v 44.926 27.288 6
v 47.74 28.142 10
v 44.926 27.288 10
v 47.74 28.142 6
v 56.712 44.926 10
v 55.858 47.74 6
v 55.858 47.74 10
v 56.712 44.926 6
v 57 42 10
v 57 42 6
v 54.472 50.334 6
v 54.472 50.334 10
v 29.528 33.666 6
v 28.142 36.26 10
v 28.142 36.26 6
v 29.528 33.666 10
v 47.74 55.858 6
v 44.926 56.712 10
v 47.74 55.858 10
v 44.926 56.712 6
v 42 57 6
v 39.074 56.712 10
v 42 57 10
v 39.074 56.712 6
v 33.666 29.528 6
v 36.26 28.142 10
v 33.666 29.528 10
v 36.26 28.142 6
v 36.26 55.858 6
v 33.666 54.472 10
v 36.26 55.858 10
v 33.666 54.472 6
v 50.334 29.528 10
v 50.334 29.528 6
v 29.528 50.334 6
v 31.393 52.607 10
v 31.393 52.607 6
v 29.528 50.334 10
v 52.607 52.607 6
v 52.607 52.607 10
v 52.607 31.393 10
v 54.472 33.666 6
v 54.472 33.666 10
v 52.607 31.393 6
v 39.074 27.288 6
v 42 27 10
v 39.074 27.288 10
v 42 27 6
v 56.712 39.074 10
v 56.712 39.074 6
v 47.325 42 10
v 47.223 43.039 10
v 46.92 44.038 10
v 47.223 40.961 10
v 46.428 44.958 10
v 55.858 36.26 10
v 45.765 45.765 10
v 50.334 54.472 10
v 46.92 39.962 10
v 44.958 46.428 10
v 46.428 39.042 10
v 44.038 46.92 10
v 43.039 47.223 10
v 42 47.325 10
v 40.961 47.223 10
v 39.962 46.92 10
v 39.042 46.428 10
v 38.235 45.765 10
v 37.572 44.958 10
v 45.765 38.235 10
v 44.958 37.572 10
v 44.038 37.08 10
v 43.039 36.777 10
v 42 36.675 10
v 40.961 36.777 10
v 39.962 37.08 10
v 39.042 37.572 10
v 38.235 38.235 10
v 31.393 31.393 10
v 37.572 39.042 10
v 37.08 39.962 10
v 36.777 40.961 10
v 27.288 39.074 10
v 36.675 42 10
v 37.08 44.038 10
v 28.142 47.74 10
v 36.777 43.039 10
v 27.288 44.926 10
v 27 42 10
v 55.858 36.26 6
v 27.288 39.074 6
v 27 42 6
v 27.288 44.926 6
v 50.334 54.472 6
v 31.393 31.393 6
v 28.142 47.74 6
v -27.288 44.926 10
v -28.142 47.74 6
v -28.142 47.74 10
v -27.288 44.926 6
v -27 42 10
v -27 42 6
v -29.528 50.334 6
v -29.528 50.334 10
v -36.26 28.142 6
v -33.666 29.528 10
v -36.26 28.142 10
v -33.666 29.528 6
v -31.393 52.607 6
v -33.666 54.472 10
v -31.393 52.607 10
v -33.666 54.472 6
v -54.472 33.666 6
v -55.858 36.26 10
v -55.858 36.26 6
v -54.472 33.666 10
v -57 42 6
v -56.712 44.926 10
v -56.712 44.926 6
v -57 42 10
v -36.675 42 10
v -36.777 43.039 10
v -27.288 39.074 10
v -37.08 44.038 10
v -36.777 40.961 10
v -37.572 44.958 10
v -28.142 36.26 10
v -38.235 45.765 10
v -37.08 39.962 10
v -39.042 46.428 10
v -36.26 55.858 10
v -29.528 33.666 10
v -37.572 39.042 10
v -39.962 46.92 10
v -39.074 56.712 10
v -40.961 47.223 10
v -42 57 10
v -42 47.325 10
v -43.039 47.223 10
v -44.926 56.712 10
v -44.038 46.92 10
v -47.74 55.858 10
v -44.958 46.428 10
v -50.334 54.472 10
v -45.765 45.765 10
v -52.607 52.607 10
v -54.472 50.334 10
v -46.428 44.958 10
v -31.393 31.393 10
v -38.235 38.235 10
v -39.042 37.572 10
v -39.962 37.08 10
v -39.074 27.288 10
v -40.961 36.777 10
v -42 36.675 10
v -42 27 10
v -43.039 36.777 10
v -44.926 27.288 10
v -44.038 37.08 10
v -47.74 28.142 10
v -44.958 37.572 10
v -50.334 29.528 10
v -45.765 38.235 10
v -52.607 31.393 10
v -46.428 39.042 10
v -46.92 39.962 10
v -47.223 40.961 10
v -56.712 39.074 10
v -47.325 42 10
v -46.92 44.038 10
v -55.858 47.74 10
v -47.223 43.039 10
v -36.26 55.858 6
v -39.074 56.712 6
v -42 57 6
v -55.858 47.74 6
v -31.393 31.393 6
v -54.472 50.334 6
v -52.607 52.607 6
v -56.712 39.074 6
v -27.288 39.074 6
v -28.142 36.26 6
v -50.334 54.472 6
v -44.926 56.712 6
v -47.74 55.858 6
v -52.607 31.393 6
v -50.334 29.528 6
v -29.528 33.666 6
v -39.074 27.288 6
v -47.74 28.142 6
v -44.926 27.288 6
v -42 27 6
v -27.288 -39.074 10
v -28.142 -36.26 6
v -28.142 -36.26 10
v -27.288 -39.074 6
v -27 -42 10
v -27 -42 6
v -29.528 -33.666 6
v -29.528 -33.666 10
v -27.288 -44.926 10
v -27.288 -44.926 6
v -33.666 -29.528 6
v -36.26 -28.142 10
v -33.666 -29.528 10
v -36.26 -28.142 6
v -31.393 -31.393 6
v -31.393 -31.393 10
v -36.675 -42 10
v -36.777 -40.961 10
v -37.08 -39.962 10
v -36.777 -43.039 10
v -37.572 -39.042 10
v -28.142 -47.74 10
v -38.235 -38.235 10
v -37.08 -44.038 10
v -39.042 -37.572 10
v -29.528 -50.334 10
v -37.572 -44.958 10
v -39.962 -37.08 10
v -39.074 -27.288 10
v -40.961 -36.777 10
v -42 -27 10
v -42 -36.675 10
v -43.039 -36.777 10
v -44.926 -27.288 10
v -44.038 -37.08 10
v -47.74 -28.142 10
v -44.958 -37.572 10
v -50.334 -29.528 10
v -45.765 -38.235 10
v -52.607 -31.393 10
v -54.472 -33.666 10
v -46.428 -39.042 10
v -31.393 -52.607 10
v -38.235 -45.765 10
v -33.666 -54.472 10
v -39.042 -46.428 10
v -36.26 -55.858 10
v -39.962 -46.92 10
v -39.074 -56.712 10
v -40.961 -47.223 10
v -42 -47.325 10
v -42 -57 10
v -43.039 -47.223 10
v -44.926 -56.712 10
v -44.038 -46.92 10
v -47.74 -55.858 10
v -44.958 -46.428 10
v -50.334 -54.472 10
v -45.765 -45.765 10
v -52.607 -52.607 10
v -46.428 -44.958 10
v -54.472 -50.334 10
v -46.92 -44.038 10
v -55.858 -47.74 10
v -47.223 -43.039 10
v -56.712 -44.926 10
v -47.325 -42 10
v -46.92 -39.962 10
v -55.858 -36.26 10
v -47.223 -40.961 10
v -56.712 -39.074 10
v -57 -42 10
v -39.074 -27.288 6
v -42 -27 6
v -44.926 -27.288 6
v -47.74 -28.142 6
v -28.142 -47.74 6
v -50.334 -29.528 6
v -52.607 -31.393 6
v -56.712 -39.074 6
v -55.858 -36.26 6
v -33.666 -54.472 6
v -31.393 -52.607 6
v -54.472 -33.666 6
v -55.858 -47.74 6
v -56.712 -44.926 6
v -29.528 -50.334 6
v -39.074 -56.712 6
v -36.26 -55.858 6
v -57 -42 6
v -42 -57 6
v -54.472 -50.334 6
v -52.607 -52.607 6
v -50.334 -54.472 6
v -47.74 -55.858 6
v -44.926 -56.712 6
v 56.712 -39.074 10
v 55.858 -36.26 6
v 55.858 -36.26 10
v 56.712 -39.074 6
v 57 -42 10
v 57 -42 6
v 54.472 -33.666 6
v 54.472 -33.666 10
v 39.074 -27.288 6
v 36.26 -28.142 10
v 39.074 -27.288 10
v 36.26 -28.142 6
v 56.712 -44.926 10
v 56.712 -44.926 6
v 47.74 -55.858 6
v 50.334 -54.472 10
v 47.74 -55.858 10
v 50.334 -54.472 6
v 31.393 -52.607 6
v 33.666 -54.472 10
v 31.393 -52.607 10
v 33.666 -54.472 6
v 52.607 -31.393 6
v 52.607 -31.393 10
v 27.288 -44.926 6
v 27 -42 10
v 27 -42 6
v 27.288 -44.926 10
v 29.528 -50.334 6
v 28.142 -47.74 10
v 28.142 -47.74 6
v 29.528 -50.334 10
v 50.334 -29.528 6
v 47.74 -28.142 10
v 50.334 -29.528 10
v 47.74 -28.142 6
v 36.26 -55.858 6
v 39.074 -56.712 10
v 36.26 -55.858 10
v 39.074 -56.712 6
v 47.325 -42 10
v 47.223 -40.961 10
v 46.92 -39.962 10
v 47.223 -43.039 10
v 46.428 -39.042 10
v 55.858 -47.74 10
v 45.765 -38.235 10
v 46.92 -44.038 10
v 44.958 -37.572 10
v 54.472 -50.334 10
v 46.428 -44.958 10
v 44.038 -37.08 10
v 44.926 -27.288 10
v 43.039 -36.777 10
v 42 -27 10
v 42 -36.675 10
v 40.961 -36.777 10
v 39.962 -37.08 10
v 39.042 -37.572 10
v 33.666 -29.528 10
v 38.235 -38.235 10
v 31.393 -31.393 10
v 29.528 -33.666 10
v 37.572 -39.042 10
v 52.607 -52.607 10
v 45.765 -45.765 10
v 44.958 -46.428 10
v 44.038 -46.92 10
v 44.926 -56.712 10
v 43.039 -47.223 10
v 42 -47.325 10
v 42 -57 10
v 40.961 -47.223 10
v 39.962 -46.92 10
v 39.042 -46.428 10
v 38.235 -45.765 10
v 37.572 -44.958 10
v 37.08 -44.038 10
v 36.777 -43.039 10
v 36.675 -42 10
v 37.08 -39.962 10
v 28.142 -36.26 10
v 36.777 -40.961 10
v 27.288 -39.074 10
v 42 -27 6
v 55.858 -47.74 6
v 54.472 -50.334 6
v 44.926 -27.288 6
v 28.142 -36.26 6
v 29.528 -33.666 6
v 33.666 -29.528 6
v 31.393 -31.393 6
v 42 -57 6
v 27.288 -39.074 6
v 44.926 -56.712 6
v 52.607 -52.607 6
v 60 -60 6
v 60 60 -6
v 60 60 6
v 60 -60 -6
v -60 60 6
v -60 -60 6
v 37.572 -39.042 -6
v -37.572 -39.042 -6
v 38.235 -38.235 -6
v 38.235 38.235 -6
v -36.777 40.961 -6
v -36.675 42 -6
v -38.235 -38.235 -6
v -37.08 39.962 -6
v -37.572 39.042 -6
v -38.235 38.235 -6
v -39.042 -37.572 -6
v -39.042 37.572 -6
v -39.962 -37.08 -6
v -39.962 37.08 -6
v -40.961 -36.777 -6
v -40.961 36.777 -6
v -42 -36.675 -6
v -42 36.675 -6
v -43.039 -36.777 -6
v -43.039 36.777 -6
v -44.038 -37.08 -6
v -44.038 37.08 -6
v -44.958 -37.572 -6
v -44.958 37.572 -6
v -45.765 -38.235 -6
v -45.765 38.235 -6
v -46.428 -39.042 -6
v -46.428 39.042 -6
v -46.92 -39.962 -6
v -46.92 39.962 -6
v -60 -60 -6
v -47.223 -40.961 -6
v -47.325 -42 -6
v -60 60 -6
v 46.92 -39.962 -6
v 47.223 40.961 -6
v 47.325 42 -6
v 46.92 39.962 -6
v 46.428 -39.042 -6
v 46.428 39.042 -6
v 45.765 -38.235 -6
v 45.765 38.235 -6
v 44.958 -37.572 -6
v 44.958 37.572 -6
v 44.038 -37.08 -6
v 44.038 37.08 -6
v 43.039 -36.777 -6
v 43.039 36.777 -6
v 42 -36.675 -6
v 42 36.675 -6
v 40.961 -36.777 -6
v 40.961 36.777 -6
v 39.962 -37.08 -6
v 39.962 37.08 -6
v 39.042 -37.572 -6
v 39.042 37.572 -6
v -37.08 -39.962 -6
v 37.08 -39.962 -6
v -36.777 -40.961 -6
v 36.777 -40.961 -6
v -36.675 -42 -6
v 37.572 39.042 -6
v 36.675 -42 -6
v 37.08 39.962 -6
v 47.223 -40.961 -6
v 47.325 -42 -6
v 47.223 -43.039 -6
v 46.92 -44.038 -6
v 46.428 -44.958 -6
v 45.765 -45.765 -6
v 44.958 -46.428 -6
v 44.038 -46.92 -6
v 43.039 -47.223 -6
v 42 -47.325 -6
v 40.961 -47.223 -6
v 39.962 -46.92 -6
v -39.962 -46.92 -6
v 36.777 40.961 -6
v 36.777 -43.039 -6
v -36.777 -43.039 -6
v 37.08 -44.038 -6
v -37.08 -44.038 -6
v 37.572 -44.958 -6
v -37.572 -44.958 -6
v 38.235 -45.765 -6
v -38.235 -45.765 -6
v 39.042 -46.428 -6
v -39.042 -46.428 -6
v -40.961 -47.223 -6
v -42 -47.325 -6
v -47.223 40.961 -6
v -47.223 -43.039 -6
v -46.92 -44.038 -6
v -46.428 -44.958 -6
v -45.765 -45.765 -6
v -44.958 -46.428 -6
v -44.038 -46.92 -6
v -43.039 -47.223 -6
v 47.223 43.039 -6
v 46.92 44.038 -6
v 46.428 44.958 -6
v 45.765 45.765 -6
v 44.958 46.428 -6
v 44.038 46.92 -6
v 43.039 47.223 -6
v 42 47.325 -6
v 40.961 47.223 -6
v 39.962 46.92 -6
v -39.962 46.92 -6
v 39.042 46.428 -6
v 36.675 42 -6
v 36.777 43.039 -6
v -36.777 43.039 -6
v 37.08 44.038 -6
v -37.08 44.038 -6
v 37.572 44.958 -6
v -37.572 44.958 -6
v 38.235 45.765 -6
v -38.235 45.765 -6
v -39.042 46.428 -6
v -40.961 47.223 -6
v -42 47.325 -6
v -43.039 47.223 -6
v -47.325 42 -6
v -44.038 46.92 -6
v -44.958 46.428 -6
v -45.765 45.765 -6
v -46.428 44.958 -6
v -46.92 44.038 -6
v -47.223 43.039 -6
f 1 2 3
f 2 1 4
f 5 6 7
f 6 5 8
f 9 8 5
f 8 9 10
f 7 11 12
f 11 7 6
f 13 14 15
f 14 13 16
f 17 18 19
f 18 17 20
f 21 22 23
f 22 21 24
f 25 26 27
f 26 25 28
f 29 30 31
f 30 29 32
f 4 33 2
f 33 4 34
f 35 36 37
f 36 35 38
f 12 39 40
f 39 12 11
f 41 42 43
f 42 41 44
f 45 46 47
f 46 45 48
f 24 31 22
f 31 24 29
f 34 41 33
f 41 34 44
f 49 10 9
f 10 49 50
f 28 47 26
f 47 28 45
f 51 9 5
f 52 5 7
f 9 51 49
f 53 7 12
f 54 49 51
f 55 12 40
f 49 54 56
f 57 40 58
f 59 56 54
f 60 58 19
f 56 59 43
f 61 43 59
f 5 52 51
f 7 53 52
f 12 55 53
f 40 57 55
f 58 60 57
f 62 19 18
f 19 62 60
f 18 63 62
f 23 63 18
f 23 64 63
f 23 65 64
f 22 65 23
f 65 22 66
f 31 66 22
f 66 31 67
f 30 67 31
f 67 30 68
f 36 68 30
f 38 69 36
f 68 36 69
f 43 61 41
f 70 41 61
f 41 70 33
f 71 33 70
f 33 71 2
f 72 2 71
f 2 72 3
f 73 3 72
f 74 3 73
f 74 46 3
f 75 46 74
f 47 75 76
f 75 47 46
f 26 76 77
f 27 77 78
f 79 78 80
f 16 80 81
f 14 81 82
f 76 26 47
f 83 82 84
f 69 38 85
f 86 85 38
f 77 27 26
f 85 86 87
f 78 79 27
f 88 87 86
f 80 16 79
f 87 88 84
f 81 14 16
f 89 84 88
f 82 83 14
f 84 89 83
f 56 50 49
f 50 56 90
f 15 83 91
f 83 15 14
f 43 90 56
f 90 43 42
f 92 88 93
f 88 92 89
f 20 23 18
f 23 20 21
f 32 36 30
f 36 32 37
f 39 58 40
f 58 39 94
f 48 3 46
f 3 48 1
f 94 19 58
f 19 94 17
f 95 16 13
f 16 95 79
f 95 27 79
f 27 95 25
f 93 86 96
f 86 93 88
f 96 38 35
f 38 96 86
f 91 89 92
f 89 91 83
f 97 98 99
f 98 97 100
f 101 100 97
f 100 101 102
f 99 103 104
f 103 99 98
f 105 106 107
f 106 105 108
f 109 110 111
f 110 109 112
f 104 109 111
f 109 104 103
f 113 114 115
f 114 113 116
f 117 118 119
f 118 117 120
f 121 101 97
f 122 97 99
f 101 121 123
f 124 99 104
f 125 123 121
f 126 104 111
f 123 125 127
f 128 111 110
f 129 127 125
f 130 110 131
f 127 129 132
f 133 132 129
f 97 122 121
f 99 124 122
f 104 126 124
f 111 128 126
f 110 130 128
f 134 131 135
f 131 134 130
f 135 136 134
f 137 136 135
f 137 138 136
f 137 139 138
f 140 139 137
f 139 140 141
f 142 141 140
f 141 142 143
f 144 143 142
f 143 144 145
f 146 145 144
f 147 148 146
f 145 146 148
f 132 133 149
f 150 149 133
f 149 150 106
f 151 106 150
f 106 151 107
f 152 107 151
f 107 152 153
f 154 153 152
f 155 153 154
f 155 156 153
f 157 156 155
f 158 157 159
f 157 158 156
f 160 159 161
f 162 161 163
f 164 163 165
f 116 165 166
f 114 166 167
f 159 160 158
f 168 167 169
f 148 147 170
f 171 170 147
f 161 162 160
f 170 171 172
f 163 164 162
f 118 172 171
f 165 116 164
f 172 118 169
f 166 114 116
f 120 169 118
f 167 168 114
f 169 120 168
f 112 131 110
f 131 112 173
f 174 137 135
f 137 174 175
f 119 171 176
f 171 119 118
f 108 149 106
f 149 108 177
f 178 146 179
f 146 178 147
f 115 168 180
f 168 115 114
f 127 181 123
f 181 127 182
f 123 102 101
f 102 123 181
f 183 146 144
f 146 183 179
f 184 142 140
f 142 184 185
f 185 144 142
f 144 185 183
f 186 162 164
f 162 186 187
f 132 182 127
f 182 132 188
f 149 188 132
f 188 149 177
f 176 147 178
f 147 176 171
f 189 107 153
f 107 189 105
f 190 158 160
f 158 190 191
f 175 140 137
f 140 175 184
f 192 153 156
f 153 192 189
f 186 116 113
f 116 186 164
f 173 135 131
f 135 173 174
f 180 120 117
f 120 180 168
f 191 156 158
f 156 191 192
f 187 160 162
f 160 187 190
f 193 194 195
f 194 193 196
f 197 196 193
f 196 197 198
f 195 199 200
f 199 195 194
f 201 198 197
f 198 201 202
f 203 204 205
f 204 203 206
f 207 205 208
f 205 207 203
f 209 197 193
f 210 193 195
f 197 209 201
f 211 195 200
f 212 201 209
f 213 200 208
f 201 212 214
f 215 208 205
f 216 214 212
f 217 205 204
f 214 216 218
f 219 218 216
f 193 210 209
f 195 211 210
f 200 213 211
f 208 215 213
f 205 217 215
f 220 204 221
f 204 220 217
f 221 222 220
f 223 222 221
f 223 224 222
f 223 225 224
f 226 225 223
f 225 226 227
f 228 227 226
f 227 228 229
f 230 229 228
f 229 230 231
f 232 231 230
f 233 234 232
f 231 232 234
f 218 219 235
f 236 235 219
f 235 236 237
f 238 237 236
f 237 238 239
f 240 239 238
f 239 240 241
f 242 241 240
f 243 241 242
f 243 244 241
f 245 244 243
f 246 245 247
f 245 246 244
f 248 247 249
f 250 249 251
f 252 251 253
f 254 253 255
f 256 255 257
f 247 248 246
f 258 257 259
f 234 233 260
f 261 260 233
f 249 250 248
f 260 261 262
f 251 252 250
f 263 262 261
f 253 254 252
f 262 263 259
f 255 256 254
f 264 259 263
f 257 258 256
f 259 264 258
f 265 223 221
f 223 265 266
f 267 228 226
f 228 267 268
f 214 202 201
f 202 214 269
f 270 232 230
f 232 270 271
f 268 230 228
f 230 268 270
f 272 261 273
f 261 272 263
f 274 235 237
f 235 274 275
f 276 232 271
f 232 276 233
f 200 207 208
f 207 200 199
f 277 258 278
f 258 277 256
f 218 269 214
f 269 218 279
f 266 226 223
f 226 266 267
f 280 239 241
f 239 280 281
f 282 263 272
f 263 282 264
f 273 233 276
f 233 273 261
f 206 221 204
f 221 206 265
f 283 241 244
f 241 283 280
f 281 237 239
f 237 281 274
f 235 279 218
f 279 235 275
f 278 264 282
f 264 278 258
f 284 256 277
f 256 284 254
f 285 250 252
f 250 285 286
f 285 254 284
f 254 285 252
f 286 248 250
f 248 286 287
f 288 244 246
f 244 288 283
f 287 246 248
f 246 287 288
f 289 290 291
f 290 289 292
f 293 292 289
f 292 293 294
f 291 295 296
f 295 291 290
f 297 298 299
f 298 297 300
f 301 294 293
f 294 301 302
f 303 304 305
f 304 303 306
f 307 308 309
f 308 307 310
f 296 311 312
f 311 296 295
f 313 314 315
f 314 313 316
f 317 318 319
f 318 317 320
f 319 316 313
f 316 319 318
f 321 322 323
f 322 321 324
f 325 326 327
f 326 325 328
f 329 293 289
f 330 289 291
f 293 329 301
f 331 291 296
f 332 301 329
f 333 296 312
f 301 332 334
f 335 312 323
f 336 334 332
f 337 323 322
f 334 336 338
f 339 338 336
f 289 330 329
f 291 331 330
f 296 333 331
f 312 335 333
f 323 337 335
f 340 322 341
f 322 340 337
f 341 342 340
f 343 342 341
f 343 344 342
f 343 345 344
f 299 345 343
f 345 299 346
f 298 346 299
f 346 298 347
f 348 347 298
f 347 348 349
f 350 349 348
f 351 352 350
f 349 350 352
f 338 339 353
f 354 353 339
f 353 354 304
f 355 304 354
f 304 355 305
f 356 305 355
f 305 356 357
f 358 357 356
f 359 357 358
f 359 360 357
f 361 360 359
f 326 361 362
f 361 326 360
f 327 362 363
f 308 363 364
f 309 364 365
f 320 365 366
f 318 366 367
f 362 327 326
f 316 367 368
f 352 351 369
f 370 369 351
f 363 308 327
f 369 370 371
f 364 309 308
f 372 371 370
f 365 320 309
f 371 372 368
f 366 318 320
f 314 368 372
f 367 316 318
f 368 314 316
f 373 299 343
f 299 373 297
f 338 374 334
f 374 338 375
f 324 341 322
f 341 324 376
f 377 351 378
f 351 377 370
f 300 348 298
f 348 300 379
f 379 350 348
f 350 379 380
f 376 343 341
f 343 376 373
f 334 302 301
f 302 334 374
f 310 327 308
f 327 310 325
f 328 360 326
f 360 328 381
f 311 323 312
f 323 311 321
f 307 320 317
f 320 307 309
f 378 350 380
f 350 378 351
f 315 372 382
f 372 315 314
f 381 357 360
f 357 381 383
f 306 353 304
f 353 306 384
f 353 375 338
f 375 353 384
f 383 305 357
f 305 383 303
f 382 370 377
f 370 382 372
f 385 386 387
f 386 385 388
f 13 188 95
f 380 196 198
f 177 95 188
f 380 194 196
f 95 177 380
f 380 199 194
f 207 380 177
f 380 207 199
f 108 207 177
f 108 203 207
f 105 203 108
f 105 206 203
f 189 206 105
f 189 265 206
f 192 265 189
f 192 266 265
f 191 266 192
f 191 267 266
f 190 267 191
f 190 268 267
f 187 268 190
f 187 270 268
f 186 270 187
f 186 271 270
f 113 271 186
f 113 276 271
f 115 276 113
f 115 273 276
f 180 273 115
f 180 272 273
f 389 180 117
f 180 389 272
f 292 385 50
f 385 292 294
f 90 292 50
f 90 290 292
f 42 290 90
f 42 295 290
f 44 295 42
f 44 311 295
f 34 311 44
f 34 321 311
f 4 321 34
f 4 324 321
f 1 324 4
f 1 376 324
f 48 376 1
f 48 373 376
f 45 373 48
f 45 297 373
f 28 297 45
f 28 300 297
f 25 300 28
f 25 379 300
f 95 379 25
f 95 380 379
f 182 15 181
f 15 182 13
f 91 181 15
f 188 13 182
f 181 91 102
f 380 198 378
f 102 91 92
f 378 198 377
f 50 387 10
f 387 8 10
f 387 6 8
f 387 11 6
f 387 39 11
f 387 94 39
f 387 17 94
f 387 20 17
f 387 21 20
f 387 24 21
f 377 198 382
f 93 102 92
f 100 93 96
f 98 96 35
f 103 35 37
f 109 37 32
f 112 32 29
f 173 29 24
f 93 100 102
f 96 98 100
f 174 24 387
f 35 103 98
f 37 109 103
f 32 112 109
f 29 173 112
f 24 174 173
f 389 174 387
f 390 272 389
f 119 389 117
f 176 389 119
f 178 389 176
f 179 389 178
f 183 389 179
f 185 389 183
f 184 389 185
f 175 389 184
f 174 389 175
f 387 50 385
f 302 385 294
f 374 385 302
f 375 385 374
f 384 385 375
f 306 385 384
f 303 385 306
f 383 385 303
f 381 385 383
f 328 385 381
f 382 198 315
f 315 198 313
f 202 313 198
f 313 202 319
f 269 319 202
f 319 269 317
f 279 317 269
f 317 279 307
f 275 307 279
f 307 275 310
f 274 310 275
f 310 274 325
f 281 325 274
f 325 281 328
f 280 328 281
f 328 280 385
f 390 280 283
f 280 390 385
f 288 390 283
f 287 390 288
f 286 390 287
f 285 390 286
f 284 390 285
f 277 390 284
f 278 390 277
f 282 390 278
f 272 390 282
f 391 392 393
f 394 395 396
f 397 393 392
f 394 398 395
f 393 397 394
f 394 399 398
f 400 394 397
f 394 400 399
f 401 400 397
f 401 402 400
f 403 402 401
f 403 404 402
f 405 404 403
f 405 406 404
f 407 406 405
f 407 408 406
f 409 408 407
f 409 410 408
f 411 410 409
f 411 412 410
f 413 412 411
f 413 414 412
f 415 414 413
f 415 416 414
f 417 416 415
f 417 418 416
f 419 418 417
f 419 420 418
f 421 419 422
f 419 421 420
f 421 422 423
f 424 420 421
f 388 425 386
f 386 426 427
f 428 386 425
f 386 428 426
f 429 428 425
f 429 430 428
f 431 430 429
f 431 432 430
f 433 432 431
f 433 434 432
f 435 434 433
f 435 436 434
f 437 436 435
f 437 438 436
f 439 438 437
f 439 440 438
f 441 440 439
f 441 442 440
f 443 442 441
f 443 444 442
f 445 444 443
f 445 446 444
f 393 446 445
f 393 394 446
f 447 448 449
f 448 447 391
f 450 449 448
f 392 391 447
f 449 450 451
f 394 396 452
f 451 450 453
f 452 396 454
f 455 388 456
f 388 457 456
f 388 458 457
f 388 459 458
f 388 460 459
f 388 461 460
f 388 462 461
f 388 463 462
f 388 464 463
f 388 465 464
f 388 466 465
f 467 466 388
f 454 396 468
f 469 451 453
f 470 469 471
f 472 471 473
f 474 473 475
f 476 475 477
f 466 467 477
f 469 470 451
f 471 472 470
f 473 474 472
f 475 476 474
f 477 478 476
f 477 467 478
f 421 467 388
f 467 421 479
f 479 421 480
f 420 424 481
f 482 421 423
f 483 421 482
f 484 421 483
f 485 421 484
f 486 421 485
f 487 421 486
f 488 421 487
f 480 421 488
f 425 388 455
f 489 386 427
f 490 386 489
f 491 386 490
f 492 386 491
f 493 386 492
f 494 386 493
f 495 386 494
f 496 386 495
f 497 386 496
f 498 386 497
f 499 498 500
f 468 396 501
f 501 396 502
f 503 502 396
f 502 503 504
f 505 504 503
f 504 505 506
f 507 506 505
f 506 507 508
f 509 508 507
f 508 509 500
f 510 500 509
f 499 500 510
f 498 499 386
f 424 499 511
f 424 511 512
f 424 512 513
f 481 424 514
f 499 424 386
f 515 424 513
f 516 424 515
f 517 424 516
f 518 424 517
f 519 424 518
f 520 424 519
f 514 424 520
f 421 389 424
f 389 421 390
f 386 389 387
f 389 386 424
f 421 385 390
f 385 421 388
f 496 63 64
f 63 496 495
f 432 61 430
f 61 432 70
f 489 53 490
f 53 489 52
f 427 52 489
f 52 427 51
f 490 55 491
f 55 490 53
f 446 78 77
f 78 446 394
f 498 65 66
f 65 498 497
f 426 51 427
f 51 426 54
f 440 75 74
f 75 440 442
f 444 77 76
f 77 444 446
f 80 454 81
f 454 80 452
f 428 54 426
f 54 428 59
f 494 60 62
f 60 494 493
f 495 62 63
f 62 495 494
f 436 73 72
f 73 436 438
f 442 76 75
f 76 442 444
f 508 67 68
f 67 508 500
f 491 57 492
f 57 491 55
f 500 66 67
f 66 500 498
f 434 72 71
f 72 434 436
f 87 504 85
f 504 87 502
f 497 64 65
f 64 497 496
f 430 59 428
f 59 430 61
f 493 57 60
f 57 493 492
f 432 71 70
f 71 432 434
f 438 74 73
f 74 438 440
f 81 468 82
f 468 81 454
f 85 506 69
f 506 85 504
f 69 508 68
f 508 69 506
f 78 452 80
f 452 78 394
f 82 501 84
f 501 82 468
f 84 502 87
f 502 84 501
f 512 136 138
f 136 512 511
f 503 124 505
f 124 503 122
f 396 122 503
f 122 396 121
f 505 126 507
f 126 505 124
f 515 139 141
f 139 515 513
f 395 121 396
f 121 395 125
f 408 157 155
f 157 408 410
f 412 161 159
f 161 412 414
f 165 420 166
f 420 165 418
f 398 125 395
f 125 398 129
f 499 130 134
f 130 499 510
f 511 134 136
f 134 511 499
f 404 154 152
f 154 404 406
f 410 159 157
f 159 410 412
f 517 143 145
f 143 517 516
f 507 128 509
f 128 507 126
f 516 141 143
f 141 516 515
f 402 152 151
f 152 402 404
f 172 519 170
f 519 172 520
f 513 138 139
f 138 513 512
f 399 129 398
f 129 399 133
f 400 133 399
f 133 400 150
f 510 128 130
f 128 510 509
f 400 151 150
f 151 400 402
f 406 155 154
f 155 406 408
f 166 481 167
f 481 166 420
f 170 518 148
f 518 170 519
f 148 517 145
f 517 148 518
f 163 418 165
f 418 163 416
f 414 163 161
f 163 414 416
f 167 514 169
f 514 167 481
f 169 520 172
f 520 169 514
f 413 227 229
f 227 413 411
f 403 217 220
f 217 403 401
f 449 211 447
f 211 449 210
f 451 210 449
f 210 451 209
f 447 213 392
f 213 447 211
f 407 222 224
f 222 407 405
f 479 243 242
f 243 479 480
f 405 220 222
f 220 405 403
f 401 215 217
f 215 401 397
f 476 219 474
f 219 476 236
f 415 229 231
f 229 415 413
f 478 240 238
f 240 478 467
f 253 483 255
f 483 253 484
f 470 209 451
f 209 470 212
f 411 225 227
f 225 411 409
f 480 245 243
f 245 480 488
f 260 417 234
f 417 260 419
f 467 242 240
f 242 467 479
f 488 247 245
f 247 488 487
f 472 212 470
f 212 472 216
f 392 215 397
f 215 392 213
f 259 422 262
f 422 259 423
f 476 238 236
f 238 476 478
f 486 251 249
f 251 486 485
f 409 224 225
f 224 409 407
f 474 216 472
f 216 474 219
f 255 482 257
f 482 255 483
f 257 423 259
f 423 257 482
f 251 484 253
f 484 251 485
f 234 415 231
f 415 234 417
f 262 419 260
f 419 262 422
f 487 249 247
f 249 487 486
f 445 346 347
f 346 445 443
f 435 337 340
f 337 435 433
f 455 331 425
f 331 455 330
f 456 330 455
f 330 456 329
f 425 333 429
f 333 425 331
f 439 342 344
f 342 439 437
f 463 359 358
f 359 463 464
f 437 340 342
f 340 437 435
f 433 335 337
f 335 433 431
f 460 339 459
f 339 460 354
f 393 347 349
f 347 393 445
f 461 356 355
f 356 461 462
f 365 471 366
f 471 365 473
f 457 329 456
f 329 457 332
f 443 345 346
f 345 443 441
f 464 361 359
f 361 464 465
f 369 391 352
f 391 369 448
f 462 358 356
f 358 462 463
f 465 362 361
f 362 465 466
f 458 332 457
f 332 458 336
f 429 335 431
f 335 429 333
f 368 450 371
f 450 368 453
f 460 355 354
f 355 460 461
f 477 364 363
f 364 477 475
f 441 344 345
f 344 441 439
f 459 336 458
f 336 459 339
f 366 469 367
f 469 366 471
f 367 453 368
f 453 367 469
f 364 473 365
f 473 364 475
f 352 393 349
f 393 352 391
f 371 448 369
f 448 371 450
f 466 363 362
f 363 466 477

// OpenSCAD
$fn = 32;

// ----------------------------------------------------------------------
// Anchor pads 120 x 120 x 16
// four corner bosses with anchor holes
// ----------------------------------------------------------------------

// --- parameters (mm) ---
plate = [120, 120, 12];  // base plate size (x, y, z)
pads = 4;                // boss count, one per corner
edge = 18;               // boss centre offset from the plate edge
boss_d = 30;             // boss diameter
boss_h = 4;              // boss height above the base plate
bore_d = 10.5;           // nominal hole diameter from the drawing
print_allowance = 0.15;  // clearance added for printing

// --- derived feature positions (mm) ---
hole_d = bore_d + print_allowance;  // = 10.65   hole diameter as printed
height = plate[2] + boss_h;         // = 16   overall height of the part
corner_x = plate[0] / 2 - edge;     // = 42   boss centre X
corner_y = plate[1] / 2 - edge;     // = 42   boss centre Y
feature_centers = [
  [corner_x, corner_y],
  [-corner_x, corner_y],
  [-corner_x, -corner_y],
  [corner_x, -corner_y]
];   // boss centres, anchor holes are drilled there

// base plate, four bosses standing on it, anchor holes all the way through
difference() {
  union() {
    cube(plate, center = true);
    for (centre = feature_centers)
      translate([centre[0], centre[1], plate[2] / 2 - 1])
        cylinder(d = boss_d, h = boss_h + 1);
  }
  for (centre = feature_centers)
    translate([centre[0], centre[1], -height])
      cylinder(d = hole_d, h = 2 * height + 2);  // through boss and plate
}
